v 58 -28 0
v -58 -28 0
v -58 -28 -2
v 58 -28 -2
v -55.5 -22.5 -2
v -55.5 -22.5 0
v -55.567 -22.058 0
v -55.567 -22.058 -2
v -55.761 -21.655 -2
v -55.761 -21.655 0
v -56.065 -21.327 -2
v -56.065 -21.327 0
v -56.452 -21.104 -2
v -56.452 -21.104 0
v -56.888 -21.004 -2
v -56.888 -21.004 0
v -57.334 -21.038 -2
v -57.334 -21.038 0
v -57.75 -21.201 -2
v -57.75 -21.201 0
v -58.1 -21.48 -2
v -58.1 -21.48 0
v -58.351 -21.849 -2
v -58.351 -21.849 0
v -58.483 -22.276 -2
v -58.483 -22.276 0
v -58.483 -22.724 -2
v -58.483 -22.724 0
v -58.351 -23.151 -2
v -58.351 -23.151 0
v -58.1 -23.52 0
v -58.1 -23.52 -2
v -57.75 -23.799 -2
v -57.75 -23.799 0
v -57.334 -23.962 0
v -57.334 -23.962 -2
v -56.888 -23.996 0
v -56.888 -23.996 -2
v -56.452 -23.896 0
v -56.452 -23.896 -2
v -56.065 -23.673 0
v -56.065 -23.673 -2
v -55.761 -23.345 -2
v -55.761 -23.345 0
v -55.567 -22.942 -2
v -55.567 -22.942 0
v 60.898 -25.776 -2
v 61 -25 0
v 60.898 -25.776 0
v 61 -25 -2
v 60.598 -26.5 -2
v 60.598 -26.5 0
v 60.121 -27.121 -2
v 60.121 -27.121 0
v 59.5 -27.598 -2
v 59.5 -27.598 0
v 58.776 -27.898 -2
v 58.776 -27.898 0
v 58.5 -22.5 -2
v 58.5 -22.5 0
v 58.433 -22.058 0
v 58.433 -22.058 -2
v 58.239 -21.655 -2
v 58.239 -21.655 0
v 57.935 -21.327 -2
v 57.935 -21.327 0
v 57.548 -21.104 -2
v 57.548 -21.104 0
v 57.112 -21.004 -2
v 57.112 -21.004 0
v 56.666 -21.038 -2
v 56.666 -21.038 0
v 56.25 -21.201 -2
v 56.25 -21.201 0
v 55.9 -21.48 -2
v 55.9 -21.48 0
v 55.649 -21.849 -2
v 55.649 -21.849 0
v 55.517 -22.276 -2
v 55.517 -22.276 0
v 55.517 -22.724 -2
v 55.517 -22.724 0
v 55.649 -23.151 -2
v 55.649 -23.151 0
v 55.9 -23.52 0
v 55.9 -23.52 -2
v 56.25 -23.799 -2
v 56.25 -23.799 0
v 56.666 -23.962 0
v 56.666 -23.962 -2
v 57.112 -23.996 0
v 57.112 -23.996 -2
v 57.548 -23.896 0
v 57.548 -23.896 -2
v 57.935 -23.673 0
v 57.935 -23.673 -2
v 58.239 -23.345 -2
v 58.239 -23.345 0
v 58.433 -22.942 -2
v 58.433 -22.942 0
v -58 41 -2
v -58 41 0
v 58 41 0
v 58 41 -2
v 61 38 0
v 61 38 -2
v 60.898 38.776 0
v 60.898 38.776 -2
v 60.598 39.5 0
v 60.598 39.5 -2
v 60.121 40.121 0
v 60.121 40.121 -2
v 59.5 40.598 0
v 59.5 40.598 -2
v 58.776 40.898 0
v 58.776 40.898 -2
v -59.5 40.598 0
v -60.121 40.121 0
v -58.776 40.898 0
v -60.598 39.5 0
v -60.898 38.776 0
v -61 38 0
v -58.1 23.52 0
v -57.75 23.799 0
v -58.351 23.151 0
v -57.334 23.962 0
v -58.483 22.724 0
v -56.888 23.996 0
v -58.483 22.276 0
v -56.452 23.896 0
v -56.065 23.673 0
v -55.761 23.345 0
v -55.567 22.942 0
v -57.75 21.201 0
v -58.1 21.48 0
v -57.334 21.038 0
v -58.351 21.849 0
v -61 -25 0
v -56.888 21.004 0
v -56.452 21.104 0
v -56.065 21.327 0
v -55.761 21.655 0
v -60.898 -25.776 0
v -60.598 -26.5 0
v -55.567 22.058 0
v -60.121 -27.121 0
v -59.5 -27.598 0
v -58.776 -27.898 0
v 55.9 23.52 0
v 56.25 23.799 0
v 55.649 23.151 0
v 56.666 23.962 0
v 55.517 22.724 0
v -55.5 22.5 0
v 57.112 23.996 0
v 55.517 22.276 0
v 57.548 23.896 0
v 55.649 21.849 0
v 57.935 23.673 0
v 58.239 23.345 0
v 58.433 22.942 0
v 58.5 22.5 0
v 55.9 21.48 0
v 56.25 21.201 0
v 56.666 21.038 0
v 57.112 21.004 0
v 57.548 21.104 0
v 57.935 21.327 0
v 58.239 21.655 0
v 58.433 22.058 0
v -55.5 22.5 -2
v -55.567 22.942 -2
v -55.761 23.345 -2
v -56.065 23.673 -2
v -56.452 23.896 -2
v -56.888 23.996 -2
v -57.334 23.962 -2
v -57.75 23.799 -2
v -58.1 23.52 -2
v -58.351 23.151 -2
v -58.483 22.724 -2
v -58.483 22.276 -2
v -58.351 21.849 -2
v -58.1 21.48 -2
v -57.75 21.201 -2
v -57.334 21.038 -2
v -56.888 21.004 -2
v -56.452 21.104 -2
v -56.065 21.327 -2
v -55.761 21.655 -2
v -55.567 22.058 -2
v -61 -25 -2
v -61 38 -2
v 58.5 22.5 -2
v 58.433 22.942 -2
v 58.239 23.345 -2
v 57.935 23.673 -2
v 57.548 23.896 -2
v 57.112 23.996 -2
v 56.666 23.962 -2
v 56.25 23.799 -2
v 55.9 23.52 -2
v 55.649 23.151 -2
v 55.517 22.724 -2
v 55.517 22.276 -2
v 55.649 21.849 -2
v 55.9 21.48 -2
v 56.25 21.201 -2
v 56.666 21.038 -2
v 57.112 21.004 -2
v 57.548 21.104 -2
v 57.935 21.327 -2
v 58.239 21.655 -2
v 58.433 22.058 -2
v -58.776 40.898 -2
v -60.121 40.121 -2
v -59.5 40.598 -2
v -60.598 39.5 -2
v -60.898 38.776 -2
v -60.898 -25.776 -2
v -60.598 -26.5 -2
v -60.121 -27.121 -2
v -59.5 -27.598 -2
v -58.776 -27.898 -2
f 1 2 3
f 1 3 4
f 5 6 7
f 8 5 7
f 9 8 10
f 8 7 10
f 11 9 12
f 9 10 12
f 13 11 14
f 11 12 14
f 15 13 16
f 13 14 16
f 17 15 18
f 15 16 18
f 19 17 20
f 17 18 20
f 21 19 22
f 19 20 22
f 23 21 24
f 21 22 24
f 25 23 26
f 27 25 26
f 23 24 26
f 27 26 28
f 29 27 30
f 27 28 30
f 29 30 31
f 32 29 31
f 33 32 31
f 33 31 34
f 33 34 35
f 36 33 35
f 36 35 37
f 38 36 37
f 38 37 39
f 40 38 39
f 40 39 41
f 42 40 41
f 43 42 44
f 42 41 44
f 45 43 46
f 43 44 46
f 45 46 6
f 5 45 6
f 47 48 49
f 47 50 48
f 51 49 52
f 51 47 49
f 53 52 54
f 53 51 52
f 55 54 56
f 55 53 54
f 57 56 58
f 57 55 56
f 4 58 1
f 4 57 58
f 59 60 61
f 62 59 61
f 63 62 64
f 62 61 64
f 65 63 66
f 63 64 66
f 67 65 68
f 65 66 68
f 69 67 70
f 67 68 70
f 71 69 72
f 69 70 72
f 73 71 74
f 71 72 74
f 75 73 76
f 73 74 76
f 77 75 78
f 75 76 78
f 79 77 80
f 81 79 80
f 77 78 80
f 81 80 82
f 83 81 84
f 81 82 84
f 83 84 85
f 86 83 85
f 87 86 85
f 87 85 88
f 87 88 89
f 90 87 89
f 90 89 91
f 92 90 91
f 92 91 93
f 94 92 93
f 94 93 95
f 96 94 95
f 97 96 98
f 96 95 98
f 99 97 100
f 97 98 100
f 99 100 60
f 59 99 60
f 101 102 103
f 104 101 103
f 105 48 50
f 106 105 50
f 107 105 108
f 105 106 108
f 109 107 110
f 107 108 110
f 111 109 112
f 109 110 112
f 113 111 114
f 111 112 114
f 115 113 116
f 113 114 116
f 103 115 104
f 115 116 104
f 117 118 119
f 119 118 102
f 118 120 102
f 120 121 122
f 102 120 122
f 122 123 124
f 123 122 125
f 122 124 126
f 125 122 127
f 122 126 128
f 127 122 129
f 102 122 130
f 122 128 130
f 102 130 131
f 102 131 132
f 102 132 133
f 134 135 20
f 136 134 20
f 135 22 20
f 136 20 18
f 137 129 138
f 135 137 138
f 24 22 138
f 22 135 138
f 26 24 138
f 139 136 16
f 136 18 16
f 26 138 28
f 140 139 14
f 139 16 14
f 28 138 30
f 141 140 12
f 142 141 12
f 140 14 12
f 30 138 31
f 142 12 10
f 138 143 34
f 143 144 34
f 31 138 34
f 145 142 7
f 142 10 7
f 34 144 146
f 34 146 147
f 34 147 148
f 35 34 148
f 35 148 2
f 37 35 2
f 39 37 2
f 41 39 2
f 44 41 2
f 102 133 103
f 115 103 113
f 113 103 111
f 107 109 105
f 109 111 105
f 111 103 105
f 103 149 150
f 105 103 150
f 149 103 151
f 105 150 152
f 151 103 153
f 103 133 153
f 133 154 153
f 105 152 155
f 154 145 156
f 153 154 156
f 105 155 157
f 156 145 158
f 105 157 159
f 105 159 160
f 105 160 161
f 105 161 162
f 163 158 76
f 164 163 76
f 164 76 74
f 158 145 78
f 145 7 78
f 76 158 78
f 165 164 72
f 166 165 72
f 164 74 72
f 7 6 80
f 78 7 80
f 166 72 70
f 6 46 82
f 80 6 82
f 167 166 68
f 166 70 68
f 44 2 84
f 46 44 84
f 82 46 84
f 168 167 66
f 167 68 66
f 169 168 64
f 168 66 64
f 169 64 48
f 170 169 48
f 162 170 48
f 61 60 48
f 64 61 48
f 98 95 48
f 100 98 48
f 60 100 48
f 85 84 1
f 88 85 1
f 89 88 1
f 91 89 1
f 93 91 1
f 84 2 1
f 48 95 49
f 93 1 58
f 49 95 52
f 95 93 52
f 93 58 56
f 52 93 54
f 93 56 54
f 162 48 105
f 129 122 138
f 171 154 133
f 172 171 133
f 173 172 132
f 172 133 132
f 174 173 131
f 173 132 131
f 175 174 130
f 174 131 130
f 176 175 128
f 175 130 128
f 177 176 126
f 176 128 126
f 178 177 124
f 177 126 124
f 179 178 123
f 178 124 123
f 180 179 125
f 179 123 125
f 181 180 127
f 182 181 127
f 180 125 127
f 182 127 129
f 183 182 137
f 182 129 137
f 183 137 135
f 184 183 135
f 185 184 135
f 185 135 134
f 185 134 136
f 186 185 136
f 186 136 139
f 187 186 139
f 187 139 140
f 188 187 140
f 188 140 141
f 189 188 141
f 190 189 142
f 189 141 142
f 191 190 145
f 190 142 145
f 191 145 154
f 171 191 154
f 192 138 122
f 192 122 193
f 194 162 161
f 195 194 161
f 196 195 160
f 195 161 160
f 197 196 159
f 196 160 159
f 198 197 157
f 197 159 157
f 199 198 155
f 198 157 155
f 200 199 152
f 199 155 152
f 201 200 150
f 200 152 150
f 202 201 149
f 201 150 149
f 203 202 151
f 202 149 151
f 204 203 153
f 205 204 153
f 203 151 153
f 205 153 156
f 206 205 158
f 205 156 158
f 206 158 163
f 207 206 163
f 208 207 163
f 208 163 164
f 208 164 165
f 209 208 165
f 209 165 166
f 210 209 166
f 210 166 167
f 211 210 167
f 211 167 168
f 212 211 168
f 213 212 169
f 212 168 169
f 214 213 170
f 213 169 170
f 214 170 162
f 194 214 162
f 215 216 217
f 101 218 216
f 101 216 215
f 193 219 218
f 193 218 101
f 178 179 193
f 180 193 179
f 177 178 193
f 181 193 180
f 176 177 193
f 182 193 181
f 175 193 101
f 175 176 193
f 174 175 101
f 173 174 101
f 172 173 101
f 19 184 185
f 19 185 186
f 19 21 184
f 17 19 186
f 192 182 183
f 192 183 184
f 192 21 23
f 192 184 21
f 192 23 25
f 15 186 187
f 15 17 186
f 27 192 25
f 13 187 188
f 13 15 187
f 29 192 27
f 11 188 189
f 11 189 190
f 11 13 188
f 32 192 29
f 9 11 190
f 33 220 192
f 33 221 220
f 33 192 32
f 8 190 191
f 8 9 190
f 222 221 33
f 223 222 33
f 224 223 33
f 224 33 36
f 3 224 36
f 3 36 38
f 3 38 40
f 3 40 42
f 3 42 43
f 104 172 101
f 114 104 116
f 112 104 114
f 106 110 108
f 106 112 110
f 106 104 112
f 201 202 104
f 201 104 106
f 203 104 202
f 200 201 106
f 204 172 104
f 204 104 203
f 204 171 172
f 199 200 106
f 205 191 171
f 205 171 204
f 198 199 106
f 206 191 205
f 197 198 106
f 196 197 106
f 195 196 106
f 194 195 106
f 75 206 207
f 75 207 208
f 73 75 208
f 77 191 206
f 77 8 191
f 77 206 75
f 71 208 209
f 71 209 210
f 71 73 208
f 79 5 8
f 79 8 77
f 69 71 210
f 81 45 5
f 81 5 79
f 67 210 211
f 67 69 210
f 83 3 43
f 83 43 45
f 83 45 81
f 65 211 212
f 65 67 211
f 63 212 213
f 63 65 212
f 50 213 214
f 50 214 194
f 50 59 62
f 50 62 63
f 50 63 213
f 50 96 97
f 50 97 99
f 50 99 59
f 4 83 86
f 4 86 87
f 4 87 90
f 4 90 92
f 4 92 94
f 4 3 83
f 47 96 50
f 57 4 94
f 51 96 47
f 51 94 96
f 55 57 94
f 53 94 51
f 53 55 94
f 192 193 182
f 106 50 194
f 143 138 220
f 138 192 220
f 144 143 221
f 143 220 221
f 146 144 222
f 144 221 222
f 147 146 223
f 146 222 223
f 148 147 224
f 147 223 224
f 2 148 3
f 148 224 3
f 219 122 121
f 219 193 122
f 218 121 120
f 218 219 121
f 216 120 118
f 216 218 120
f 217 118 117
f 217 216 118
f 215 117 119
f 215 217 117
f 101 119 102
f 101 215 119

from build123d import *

# Parameters (mm, degrees)
F0_W     = 122
F0_H     = 56
F0_R     = 1.5
F1_DEPTH = 2
F2_DEPTH = 13
F4_R     = 3


with BuildPart() as f1:
    # F0 (on Top) → F1 (new body)
    with BuildSketch(Plane.XY):
        Rectangle(F0_W, F0_H)
        with Locations((-57, -22.5)):
            Circle(F0_R, mode=Mode.SUBTRACT)
        with Locations((57, -22.5)):
            Circle(F0_R, mode=Mode.SUBTRACT)
        with Locations((-57, 22.5)):
            Circle(F0_R, mode=Mode.SUBTRACT)
        with Locations((57, 22.5)):
            Circle(F0_R, mode=Mode.SUBTRACT)
    extrude(amount=-F1_DEPTH)

    # F2 (add): a face of the model
    f2_faces = [f1.faces().sort_by_distance(p)[0] for p in [
        (0, 28, -1),
    ]]
    extrude(f2_faces, amount=F2_DEPTH)

    # F4
    f4_edges = [f1.edges().sort_by_distance(p)[0] for p in [
        (-61, -28, -1),
        (61, -28, -1),
        (61, 41, -1),
        (-61, 41, -1),
    ]]
    fillet(f4_edges, radius=F4_R)


solid = f1.part
